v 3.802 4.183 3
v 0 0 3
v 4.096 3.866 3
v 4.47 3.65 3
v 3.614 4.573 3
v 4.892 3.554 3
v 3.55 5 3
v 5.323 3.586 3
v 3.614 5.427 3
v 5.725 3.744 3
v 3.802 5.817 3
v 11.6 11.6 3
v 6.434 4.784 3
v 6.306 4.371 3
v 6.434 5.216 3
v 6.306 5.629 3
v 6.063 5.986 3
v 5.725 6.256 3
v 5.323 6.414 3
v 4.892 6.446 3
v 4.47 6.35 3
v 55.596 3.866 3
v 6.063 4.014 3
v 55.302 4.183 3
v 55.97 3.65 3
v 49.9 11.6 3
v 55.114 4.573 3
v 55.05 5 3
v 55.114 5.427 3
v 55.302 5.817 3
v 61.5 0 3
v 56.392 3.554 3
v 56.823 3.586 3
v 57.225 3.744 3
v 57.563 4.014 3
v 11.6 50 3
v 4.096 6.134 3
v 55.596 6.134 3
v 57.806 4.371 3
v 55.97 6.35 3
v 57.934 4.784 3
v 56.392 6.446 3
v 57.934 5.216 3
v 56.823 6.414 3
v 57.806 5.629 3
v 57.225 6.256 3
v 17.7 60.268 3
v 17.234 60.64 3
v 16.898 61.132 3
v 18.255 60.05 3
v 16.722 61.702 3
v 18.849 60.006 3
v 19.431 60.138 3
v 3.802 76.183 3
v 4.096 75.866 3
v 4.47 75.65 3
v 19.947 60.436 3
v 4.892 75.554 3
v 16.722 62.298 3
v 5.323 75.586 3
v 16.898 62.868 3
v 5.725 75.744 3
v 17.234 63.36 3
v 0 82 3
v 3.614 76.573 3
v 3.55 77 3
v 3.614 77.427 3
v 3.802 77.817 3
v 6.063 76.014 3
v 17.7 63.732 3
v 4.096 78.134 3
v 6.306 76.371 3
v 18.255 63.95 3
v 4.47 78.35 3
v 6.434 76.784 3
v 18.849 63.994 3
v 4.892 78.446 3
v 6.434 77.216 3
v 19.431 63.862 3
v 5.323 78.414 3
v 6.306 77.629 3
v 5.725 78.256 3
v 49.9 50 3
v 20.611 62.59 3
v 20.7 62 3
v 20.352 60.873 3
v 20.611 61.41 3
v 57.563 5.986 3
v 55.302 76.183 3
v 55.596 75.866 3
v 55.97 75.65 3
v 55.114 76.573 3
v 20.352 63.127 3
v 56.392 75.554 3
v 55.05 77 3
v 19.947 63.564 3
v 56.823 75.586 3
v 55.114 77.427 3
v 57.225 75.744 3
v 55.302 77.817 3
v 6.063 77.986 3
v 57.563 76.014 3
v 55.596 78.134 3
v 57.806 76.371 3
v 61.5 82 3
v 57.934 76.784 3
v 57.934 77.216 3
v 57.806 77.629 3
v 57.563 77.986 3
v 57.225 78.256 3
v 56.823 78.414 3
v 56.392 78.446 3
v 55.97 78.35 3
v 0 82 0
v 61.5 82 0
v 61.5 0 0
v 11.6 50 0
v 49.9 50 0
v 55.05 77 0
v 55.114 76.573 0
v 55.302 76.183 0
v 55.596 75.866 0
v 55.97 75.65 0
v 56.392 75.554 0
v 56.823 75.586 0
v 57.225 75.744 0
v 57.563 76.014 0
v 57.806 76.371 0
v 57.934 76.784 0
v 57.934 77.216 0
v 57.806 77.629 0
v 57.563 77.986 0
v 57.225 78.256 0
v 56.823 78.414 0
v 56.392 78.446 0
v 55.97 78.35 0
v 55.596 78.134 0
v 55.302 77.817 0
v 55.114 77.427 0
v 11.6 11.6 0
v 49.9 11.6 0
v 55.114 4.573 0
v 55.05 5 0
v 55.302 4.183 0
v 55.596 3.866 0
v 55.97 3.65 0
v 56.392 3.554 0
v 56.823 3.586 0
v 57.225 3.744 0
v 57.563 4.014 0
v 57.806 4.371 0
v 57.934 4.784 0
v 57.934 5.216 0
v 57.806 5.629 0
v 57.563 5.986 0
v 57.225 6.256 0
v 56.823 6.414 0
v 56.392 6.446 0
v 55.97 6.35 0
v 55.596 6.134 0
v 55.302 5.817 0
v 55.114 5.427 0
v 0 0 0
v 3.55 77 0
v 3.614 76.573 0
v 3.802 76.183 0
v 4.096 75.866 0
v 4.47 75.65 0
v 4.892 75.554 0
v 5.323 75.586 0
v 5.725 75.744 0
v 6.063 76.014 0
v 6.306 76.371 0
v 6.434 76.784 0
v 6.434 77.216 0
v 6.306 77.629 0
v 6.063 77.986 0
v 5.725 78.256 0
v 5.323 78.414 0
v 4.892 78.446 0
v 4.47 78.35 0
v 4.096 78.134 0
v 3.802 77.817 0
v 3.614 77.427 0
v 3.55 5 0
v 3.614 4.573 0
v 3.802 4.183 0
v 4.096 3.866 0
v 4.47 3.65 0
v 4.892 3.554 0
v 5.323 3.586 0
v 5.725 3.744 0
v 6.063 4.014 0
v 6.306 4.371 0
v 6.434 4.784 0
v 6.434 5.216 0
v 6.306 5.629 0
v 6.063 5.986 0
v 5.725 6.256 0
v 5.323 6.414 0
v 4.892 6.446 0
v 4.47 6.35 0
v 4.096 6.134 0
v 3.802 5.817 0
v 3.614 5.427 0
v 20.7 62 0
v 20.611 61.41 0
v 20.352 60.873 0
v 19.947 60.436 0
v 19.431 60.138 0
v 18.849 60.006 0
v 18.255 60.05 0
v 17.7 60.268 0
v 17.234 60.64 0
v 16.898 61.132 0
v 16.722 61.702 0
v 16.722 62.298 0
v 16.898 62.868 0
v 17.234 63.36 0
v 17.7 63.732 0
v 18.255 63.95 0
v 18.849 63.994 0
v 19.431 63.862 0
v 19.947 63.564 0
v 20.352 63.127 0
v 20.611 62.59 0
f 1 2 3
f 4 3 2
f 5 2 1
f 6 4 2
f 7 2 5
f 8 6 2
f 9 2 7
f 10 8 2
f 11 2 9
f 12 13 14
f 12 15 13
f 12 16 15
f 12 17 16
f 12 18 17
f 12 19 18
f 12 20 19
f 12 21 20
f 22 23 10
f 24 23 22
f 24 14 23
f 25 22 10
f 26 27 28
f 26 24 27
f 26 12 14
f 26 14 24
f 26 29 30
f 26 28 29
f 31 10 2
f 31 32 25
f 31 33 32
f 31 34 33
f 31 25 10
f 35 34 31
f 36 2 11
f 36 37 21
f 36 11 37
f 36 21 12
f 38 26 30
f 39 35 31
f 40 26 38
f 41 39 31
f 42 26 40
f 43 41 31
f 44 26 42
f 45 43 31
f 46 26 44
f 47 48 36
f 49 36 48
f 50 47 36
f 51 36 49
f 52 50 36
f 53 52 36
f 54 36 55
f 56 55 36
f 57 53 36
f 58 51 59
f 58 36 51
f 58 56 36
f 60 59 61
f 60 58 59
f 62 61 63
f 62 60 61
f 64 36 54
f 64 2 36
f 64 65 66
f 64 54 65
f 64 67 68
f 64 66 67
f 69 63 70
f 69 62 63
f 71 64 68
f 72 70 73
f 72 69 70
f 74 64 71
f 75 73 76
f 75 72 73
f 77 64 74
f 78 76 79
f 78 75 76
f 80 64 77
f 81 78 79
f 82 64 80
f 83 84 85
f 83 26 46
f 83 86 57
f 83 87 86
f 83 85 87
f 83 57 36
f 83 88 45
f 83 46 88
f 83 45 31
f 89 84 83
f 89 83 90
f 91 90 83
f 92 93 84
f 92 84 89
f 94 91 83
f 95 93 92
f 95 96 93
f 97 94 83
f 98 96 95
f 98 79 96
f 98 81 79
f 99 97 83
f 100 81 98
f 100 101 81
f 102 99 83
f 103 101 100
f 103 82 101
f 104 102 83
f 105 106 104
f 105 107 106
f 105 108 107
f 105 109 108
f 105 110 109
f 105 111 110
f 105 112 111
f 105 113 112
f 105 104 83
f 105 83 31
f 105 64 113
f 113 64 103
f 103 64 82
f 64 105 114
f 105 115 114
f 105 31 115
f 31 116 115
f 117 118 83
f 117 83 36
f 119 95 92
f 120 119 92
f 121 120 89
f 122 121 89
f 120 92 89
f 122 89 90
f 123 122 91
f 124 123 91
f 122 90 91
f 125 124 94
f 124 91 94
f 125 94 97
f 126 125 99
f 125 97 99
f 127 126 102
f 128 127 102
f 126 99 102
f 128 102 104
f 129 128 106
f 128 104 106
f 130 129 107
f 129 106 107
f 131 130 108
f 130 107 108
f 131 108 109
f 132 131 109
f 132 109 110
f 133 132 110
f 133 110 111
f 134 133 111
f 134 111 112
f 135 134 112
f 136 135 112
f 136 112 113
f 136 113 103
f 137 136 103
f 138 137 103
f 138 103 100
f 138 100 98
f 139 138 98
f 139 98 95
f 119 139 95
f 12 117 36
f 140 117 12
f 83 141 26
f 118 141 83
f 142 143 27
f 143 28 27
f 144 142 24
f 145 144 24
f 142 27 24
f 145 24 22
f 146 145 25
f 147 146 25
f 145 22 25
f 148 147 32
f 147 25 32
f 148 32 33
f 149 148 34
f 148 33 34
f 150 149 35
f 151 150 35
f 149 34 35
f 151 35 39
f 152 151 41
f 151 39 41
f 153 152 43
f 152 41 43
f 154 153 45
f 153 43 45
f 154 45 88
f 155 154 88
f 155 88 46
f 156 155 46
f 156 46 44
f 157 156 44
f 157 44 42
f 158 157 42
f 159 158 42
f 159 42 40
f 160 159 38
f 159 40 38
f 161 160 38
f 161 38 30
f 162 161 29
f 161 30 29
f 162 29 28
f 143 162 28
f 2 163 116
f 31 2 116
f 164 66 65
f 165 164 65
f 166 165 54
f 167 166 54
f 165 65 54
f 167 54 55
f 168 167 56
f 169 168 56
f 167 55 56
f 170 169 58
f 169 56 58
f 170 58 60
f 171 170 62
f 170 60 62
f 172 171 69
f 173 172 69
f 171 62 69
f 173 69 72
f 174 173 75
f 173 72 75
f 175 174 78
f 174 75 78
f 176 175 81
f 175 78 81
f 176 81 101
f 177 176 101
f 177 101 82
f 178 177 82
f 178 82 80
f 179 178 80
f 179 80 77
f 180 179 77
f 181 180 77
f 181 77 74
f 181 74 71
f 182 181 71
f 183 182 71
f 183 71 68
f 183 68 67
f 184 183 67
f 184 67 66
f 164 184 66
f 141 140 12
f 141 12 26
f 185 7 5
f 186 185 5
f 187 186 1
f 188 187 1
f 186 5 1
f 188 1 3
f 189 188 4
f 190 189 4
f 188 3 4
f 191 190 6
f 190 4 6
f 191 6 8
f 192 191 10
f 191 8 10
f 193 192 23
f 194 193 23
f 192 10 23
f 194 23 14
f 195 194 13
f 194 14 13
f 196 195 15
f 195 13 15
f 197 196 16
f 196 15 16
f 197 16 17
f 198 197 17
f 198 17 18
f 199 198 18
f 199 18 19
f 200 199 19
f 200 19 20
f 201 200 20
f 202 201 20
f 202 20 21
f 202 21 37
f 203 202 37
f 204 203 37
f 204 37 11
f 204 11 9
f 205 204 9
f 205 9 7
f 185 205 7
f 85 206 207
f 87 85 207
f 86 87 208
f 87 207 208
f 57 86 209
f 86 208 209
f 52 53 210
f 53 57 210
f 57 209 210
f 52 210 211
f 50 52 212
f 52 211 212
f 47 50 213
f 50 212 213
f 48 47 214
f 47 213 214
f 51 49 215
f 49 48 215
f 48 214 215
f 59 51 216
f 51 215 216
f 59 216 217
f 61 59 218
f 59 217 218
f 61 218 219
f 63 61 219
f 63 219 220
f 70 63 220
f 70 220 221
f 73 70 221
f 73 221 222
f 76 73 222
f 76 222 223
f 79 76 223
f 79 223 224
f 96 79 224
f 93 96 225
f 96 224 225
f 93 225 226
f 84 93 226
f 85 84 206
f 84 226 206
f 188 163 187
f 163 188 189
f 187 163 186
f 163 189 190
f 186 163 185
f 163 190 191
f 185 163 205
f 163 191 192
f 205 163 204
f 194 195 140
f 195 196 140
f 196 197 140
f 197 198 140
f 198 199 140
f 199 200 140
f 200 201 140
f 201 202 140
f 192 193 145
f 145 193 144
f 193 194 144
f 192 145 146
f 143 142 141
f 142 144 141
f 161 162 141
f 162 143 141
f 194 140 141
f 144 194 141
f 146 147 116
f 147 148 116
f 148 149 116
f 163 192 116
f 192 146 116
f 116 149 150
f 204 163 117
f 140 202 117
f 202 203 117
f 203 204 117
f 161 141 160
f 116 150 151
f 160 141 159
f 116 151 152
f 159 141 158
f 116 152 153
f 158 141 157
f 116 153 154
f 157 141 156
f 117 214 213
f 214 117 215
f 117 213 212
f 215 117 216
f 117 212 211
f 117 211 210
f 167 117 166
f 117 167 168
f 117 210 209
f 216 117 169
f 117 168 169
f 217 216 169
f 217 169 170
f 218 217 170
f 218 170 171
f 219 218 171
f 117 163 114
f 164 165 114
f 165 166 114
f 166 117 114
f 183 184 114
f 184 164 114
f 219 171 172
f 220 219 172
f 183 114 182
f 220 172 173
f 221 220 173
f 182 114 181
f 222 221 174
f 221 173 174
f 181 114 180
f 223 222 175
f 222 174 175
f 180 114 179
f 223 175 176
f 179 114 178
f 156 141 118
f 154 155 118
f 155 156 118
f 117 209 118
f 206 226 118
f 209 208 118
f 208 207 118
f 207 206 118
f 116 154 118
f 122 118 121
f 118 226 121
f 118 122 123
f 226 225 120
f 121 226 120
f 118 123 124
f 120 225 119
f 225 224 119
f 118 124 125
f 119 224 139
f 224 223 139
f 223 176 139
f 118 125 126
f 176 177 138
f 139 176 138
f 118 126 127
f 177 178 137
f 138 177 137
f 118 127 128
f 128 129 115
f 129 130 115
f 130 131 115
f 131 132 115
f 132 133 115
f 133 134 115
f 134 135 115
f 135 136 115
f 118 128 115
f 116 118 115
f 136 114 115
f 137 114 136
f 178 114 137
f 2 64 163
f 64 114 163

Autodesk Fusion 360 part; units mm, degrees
sketch "Sketch1" plane through (0, 0, 0) normal (0, 0, 1) x (1, 0, 0)
  line L0 (0, 0) -> (61.5, 0)
  line L1 (61.5, 0) -> (61.5, 82)
  line L2 (61.5, 82) -> (0, 82)
  line L3 (0, 82) -> (0, 0)
  dimension "d1" = 82
  dimension "d2" = 61.5
extrude "Extrude1" add sketch "Sketch1" along normal blind 3
sketch "Sketch2" plane through (0, 0, 3) normal (0, 0, 1) x (-1, 0, 0)
  line L0 (0, -82) -> (0, 0)
  line L1 (0, 0) -> (-61.5, 0)
  line L2 (-61.5, 0) -> (-61.5, -82)
  line L3 (-61.5, -82) -> (0, -82)
  circle A0 centre (-5, -5) radius 1.45
  circle A1 centre (-5, -77) radius 1.45
  circle A2 centre (-56.5, -77) radius 1.45
  circle A3 centre (-56.5, -5) radius 1.45
  dimension "d5" = 2.9
  dimension "d6" = 5
  dimension "d7" = 5
  dimension "d8" = 2.9
  dimension "d9" = 5
  dimension "d10" = 5
  dimension "d11" = 2.9
  dimension "d12" = 5
  dimension "d13" = 5
  dimension "d14" = 2.9
  dimension "d15" = 5
  dimension "d16" = 5
extrude "Extrude2" cut sketch "Sketch2" against normal blind 3 contours A0 | A1 | A2 | A3
sketch "Sketch3" plane through (0, 0, 0) normal (0, 0, 1) x (1, 0, 0)
  line L0 (10, 72) -> (51.5, 72)
  line L1 (51.5, 72) -> (51.5, 10)
  line L2 (51.5, 10) -> (10, 10)
  line L3 (10, 10) -> (10, 72)
  line L4 (61.5, 82) -> (0, 82)
  line L5 (61.5, 0) -> (61.5, 82)
  line L6 (0, 0) -> (61.5, 0)
  line L7 (0, 82) -> (0, 0)
  dimension "d19" = 10
  dimension "d20" = 10
  dimension "d21" = 10
  dimension "d22" = 10
sketch "Sketch4" plane through (0, 0, 0) normal (0, 0, 1) x (1, 0, 0)
sketch "Sketch5" plane through (0, 0, 0) normal (0, 0, 1) x (1, 0, 0)
sketch "Sketch6" plane through (0, 0, 0) normal (0, 0, 1) x (1, 0, 0)
  line L0 (49.9, 50) -> (11.6, 50)
  line L1 (11.6, 50) -> (11.6, 11.6)
  line L2 (11.6, 11.6) -> (49.9, 11.6)
  line L3 (49.9, 11.6) -> (49.9, 50)
  line L4 (51.5, 72) -> (51.5, 10)
  line L5 (10, 10) -> (10, 72)
  line L6 (51.5, 10) -> (10, 10)
  line L7 (10, 72) -> (51.5, 72)
  dimension "d23" = 1.6
  dimension "d24" = 1.6
  dimension "d25" = 1.6
  dimension "d26" = 22
sketch "Sketch7" plane through (0, 0, 0) normal (0, 0, 1) x (1, 0, 0)
  circle A0 centre (18.7, 62) radius 2
  line L0 (10, 72) -> (51.5, 72)
  line L1 (10, 10) -> (10, 72)
  dimension "d30" = 4
  dimension "d31" = 10
  dimension "d32" = 8.7
extrude "Extrude3" cut sketch "Sketch6" sketch "Sketch7" along normal blind 3 contours L0 L1 L2 L3 of sketch 2
